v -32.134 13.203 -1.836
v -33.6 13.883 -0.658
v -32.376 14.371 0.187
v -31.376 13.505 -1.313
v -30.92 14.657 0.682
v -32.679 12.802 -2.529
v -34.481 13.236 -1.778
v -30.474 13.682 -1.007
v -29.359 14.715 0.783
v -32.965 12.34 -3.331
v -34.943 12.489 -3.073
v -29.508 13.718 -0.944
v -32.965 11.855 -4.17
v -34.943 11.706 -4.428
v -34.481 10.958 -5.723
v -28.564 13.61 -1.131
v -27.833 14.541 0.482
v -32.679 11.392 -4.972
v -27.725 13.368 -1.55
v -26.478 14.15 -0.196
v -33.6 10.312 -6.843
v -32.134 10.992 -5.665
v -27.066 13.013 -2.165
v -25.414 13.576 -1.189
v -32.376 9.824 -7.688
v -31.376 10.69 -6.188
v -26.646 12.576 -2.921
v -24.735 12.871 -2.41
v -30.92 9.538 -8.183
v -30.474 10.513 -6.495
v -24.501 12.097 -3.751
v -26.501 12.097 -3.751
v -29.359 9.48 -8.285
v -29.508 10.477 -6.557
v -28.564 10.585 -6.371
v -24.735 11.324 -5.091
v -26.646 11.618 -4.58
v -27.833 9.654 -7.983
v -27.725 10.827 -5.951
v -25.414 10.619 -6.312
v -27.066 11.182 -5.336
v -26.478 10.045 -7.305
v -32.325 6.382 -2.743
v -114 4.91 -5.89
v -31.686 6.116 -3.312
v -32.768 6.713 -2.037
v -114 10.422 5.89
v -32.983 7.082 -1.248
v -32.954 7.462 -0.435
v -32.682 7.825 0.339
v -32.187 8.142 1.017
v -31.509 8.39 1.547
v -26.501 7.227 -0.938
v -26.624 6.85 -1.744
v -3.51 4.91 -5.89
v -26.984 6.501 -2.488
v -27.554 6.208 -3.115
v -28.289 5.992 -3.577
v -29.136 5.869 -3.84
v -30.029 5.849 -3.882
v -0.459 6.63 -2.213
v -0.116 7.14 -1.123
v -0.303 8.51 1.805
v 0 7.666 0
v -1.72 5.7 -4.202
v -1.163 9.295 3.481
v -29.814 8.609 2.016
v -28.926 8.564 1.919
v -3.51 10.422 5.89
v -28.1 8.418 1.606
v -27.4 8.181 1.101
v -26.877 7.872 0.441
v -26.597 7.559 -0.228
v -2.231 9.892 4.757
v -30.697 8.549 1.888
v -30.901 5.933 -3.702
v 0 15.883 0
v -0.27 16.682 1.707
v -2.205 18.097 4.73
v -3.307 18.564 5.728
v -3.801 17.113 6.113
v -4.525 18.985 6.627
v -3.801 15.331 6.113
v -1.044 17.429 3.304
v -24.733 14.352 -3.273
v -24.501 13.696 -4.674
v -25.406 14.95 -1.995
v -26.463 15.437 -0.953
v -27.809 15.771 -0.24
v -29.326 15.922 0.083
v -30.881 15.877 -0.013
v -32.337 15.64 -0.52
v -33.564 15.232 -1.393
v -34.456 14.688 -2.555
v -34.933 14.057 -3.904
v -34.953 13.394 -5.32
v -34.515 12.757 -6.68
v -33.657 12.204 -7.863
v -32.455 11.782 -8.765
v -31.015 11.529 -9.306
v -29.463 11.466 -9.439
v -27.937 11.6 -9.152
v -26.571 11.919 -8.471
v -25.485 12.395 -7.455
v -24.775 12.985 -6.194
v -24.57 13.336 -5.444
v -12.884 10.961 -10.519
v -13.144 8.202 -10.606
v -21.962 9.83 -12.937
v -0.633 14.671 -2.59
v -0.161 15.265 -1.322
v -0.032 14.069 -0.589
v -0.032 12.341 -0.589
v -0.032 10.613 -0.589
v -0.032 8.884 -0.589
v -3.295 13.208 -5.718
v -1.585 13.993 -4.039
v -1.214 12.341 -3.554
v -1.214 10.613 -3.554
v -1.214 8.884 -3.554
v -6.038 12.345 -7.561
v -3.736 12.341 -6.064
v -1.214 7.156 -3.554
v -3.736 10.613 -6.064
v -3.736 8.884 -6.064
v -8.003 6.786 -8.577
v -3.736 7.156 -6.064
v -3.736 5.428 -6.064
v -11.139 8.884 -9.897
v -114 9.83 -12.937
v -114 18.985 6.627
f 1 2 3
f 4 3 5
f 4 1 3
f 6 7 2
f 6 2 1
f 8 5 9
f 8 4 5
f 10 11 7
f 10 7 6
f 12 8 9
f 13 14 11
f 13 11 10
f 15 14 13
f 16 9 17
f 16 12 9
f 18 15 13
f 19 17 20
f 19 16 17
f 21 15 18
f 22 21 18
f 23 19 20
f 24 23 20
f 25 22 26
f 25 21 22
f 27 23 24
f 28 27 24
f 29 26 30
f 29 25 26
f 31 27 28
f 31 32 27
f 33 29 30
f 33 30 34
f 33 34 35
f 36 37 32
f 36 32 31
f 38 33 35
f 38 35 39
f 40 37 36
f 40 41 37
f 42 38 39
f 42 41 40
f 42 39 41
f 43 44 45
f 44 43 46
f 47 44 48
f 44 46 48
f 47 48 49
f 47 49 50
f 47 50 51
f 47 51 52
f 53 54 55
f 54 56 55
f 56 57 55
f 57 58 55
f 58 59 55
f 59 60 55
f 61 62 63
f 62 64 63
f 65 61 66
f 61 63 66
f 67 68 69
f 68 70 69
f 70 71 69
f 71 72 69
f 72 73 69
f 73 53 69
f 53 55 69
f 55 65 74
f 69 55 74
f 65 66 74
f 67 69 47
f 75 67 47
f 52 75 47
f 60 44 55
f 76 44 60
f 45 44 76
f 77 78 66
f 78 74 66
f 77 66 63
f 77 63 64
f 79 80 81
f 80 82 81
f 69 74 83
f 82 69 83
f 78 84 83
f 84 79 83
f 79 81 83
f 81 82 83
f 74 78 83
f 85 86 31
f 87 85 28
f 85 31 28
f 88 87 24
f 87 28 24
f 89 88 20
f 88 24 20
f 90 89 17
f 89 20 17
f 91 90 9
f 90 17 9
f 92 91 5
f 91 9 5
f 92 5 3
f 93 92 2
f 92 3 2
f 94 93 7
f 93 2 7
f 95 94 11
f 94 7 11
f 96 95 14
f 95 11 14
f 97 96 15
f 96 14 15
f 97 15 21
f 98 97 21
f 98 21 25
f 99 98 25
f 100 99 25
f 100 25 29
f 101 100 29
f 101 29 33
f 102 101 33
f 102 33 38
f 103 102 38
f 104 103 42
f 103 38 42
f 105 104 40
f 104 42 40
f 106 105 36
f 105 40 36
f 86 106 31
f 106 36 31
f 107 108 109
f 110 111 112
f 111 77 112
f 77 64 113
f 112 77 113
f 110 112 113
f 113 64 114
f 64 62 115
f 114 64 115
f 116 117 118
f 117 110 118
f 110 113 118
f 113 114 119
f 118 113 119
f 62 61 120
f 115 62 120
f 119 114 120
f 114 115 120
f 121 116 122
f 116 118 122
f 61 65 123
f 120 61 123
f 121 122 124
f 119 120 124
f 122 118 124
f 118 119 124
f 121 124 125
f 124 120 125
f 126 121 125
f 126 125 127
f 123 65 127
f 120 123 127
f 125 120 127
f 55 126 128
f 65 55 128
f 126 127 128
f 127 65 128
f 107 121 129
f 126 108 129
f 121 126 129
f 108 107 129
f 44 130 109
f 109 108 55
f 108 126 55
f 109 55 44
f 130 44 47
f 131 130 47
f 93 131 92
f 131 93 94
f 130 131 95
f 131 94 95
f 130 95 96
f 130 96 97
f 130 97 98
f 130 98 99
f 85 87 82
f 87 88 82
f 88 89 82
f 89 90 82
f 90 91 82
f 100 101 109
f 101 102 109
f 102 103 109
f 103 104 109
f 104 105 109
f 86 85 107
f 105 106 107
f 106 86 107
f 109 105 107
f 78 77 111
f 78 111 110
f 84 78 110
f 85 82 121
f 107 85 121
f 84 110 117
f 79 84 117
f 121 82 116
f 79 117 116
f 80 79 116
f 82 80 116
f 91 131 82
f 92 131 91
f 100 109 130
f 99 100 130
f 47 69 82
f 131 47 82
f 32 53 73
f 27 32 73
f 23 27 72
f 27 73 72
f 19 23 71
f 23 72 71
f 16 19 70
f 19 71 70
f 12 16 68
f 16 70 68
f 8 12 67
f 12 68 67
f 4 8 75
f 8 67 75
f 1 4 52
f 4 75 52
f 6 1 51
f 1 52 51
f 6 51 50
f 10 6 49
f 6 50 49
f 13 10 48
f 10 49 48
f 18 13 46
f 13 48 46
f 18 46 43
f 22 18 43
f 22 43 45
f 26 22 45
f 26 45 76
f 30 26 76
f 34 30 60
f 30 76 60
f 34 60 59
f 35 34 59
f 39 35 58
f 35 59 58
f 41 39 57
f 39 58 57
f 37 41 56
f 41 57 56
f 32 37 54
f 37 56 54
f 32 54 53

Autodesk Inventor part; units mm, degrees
sketch "Sketch5" plane through (0, 0, 0) normal (0, 1, 0) x (-1, 0, 0)
  spline S0 degree 4 poles (214, 0.3449) (213.9235, 0.3586) (213.5504, 0.4255) (212.9247, 0.5375) (211.8694, 0.7251) (210.7617, 0.9209) (209.4043, 1.1592) (207.8102, 1.4368) (205.9789, 1.7525) (203.9169, 2.1042) (201.6282, 2.4897) (199.1185, 2.907) (196.3936, 3.3535) (193.4599, 3.8269) (190.3242, 4.3245) (186.9939, 4.8439) (183.4768, 5.3823) (179.781, 5.937) (175.9152, 6.5054) (171.8885, 7.0847) (167.7102, 7.6721) (163.3902, 8.265) (158.9384, 8.8603) (154.3653, 9.4553) (149.6816, 10.047) (144.8982, 10.6323) (140.0263, 11.2083) (135.0773, 11.7717) (130.0627, 12.3193) (124.9942, 12.8478) (119.8837, 13.3538) (114.7431, 13.8337) (109.5844, 14.2841) (104.4196, 14.7015) (99.2609, 15.0822) (94.1202, 15.4227) (89.0095, 15.7197) (83.9407, 15.9697) (78.9258, 16.1695) (73.9764, 16.3162) (69.104, 16.4071) (64.32, 16.4396) (59.6357, 16.4118) (55.0618, 16.3218) (50.6091, 16.1683) (46.288, 15.9504) (42.1085, 15.6678) (38.0804, 15.3204) (34.213, 14.9088) (30.5154, 14.4338) (26.9962, 13.8969) (23.6634, 13.3) (20.5248, 12.6451) (17.5876, 11.9348) (14.8584, 11.1717) (12.3433, 10.3589) (10.0479, 9.4991) (7.977, 8.5956) (6.1348, 7.651) (4.5247, 6.6676) (3.1496, 5.6471) (2.0123, 4.5896) (1.1163, 3.495) (0.468, 2.3618) (0.0758, 1.1958) (-0.0534, 0) (0.0758, -1.1958) (0.468, -2.3618) (1.1163, -3.495) (2.0123, -4.5896) (3.1496, -5.6471) (4.5247, -6.6676) (6.1348, -7.651) (7.977, -8.5956) (10.0479, -9.4991) (12.3433, -10.3589) (14.8584, -11.1717) (17.5876, -11.9348) (20.5248, -12.6451) (23.6634, -13.3) (26.9962, -13.8969) (30.5154, -14.4338) (34.213, -14.9088) (38.0804, -15.3204) (42.1085, -15.6678) (46.288, -15.9504) (50.6091, -16.1683) (55.0618, -16.3218) (59.6357, -16.4118) (64.32, -16.4396) (69.104, -16.4071) (73.9764, -16.3162) (78.9258, -16.1695) (83.9407, -15.9697) (89.0095, -15.7197) (94.1202, -15.4227) (99.2609, -15.0822) (104.4196, -14.7015) (109.5844, -14.2841) (114.7431, -13.8337) (119.8837, -13.3538) (124.9942, -12.8478) (130.0627, -12.3193) (135.0773, -11.7717) (140.0263, -11.2083) (144.8982, -10.6323) (149.6816, -10.047) (154.3653, -9.4553) (158.9384, -8.8603) (163.3902, -8.265) (167.7102, -7.6721) (171.8885, -7.0847) (175.9152, -6.5054) (179.781, -5.937) (183.4768, -5.3823) (186.9939, -4.8439) (190.3242, -4.3245) (193.4599, -3.8269) (196.3936, -3.3535) (199.1185, -2.907) (201.6282, -2.4897) (203.9169, -2.1042) (205.9789, -1.7525) (207.8102, -1.4368) (209.4043, -1.1592) (210.7617, -0.9209) (211.8694, -0.7251) (212.9247, -0.5375) (213.5504, -0.4255) (213.9235, -0.3586) (214, -0.3449) knots 0 0 0 0 0 0.006275 0.009968 0.014263 0.019074 0.024344 0.030027 0.036088 0.042498 0.04923 0.056263 0.063574 0.071147 0.078961 0.087003 0.095255 0.103702 0.112331 0.121128 0.130079 0.13917 0.148391 0.157726 0.167166 0.176696 0.186306 0.195983 0.205715 0.215491 0.225299 0.235127 0.244964 0.254798 0.264619 0.274414 0.284172 0.293881 0.303532 0.313111 0.322608 0.332012 0.34131 0.350493 0.359549 0.368466 0.377233 0.385838 0.39427 0.402518 0.410569 0.418411 0.426034 0.433424 0.440569 0.447459 0.454083 0.460432 0.466498 0.472281 0.477786 0.483031 0.48805 0.4929 0.497646 0.502354 0.5071 0.51195 0.516969 0.522214 0.527719 0.533502 0.539568 0.545917 0.552541 0.559431 0.566576 0.573966 0.581589 0.589431 0.597482 0.60573 0.614162 0.622767 0.631534 0.640451 0.649507 0.65869 0.667988 0.677392 0.686889 0.696468 0.706119 0.715828 0.725586 0.735381 0.745202 0.755036 0.764873 0.774701 0.784509 0.794285 0.804017 0.813694 0.823304 0.832834 0.842274 0.851609 0.86083 0.869921 0.878872 0.887669 0.896298 0.904745 0.912997 0.921039 0.928853 0.936426 0.943737 0.95077 0.957502 0.963912 0.969973 0.975656 0.980926 0.985737 0.990032 0.993725 1 1 1 1 1
  line L0 (204.525, -2) -> (204.525, 2)
  line L1 (204.525, 0) -> (0, 0)
  line L2 (0, 0) -> (61.2, 0)
  line L3 (61.2, 0) -> (61.2, -16.415)
  line L4 (61.2, -16.415) -> (61.2, 16.415)
  point P0 (0, 0)
  point P1 (213.875, 0.3673)
  point P2 (213.5005, 0.4344)
  point P3 (212.8772, 0.5457)
  point P4 (212.0066, 0.7006)
  point P5 (210.8908, 0.8979)
  point P6 (209.5323, 1.1364)
  point P7 (207.9344, 1.4146)
  point P8 (206.1007, 1.7309)
  point P9 (204.0356, 2.0831)
  point P10 (201.7438, 2.4693)
  point P11 (199.2308, 2.8872)
  point P12 (196.5023, 3.3344)
  point P13 (193.5648, 3.8084)
  point P14 (190.4252, 4.3068)
  point P15 (187.0907, 4.8269)
  point P16 (183.5691, 5.366)
  point P17 (179.8687, 5.9215)
  point P18 (175.9981, 6.4907)
  point P19 (171.9664, 7.0708)
  point P20 (167.7829, 7.6591)
  point P21 (163.4575, 8.2526)
  point P22 (159.0002, 8.8488)
  point P23 (154.4215, 9.4444)
  point P24 (149.732, 10.0368)
  point P25 (144.9427, 10.6228)
  point P26 (140.0648, 11.1993)
  point P27 (135.1097, 11.7633)
  point P28 (130.0889, 12.3114)
  point P29 (125.0142, 12.8402)
  point P30 (119.8974, 13.3464)
  point P31 (114.7505, 13.8266)
  point P32 (109.5855, 14.2771)
  point P33 (104.4145, 14.6943)
  point P34 (99.2495, 15.0749)
  point P35 (94.1026, 15.4151)
  point P36 (88.9858, 15.7116)
  point P37 (83.9111, 15.961)
  point P38 (78.8903, 16.1601)
  point P39 (73.9352, 16.306)
  point P40 (69.0573, 16.3958)
  point P41 (64.268, 16.4271)
  point P42 (59.5785, 16.3978)
  point P43 (54.9998, 16.3062)
  point P44 (50.5425, 16.1509)
  point P45 (46.2171, 15.931)
  point P46 (42.0336, 15.6461)
  point P47 (38.0019, 15.2962)
  point P48 (34.1313, 14.8818)
  point P49 (30.4309, 14.4038)
  point P50 (26.9093, 13.8636)
  point P51 (23.5748, 13.2629)
  point P52 (20.4352, 12.6039)
  point P53 (17.4977, 11.889)
  point P54 (14.7693, 11.1209)
  point P55 (12.2562, 10.3027)
  point P56 (9.9644, 9.4372)
  point P57 (7.8993, 8.5276)
  point P58 (6.0656, 7.5769)
  point P59 (4.4677, 6.5883)
  point P60 (3.1092, 5.5644)
  point P61 (1.9934, 4.5081)
  point P62 (1.1228, 3.4216)
  point P63 (0.4995, 2.307)
  point P64 (0.125, 1.1661)
  point P65 (0.125, -1.1661)
  point P66 (0.4995, -2.307)
  point P67 (1.1228, -3.4216)
  point P68 (1.9934, -4.5081)
  point P69 (3.1092, -5.5644)
  point P70 (4.4677, -6.5883)
  point P71 (6.0656, -7.5769)
  point P72 (7.8993, -8.5276)
  point P73 (9.9644, -9.4372)
  point P74 (12.2562, -10.3027)
  point P75 (14.7693, -11.1209)
  point P76 (17.4977, -11.889)
  point P77 (20.4352, -12.6039)
  point P78 (23.5748, -13.2629)
  point P79 (26.9093, -13.8636)
  point P80 (30.4309, -14.4038)
  point P81 (34.1313, -14.8818)
  point P82 (38.0019, -15.2962)
  point P83 (42.0336, -15.6461)
  point P84 (46.2171, -15.931)
  point P85 (50.5425, -16.1509)
  point P86 (54.9998, -16.3062)
  point P87 (59.5785, -16.3978)
  point P88 (64.268, -16.4271)
  point P89 (69.0573, -16.3958)
  point P90 (73.9352, -16.306)
  point P91 (78.8903, -16.1601)
  point P92 (83.9111, -15.961)
  point P93 (88.9858, -15.7116)
  point P94 (94.1026, -15.4151)
  point P95 (99.2495, -15.0749)
  point P96 (104.4145, -14.6943)
  point P97 (109.5855, -14.2771)
  point P98 (114.7505, -13.8266)
  point P99 (119.8974, -13.3464)
  point P100 (125.0142, -12.8402)
  point P101 (130.0889, -12.3114)
  point P102 (135.1097, -11.7633)
  point P103 (140.0648, -11.1993)
  point P104 (144.9427, -10.6228)
  point P105 (149.732, -10.0368)
  point P106 (154.4215, -9.4444)
  point P107 (159.0002, -8.8488)
  point P108 (163.4575, -8.2526)
  point P109 (167.7829, -7.6591)
  point P110 (171.9664, -7.0708)
  point P111 (175.9981, -6.4907)
  point P112 (179.8687, -5.9215)
  point P113 (183.5691, -5.366)
  point P114 (187.0907, -4.8269)
  point P115 (190.4252, -4.3068)
  point P116 (193.5648, -3.8084)
  point P117 (196.5023, -3.3344)
  point P118 (199.2308, -2.8872)
  point P119 (201.7438, -2.4693)
  point P120 (204.0356, -2.0831)
  point P121 (206.1007, -1.7309)
  point P122 (207.9344, -1.4146)
  point P123 (209.5323, -1.1364)
  point P124 (210.8908, -0.8979)
  point P125 (212.0066, -0.7006)
  point P126 (212.8772, -0.5457)
  point P127 (213.5005, -0.4344)
  point P128 (213.875, -0.3673)
  dimension "d28" = 204.525
  dimension "d29" = 61.2
  dimension "d30" = 32.8299
extrude "Main Wing" add sketch "Sketch5" along normal blind 453.491
sketch "Sketch6" plane through (-204.525, 0, 2) normal (-1, 0, 0) x (0, 0, 1)
  line L0 (0, 0) -> (0, 66.548)
  line L1 (0, 453.4889) -> (0, 366.5701)
  line L2 (20, 366.5701) -> (-20, 366.5701)
  line L3 (-20, 66.548) -> (20, 66.548)
  line L4 (20, 66.548) -> (20, 366.5701)
  line L5 (-20, 366.5701) -> (-20, 66.548)
  point P0 (-2, 0)
  dimension "d31" = 66.548
  dimension "d32" = 86.9188
  dimension "d33" = 40
  dimension "d34" = 40
  dimension "d43" = 300.0221
extrude "Rectangle Elevron Gap" cut sketch "Sketch6" against normal blind 69.6214
sketch "Sketch7" plane through (-204.525, 66.548, 2) normal (0, 1, 0) x (1, 0, 0)
  line L0 (69.6201, 13.7865) -> (69.6201, -9.7851)
  line L1 (69.6201, -9.7851) -> (69.6201, 2.0009)
  circle A0 centre (69.6201, 2.0009) radius 17
  circle A1 centre (69.6201, 2.0009) radius 1.7526
  point P0 (204.525, 2)
  point P1 (69.6201, 3.7535)
  point P2 (69.6201, 0.2483)
  dimension "d37" = 23.5717
  dimension "d38" = 11.786
  dimension "d41" = 34
  dimension "d42" = 3.5052
extrude "Circle Elevron Gap" cut sketch "Sketch7" along normal blind 300.0221 contours A1 L0 | A0 picked at (69.7501, 0.8471)
sketch "Sketch8" plane through (0, 453.491, 0) normal (0, 1, 0) x (1, 0, 0)
  line L0 (-204.5238, 0) -> (-143.0304, 0)
  circle A0 centre (-143.0304, 0) radius 1.7526
  point P0 (0, 0)
  dimension "d46" = 61.4934
  dimension "d47" = 3.5052
extrude "Elevron Screw Hole" cut sketch "Sketch8" against normal blind 454.0221
ref_plane "Leading Edge Plane" through (0, 226.7455, 0) normal (-1, 0, 0) x (0, 0, 1)
sketch "Sketch9" plane through (0, 226.7455, 0) normal (-1, 0, 0) x (0, 0, 1)
  line L0 (0, -226.7455) -> (0, 226.7401)
  line L1 (0, 226.7401) -> (0, 213.1781)
  line L2 (0, 213.1781) -> (0, 194.4281)
  circle A0 centre (0, 194.4281) radius 18.75
  line L3 (-14.0018, 198.1799) -> (3.7518, 208.4299)
  line L4 (3.7518, 208.4299) -> (14.0018, 190.6764)
  line L5 (14.0018, 190.6764) -> (-3.7518, 180.4264)
  line L6 (-3.7518, 180.4264) -> (-14.0018, 198.1799)
  line L7 (-14.0018, 198.1799) -> (14.0018, 190.6764) construction
  line L8 (3.7518, 208.4299) -> (-3.7518, 180.4264) construction
  circle A1 centre (0, 194.4281) radius 15.5
  dimension "d50" = 13.562
  dimension "d51" = 18.75
  dimension "d52" = 37.5
  dimension "d55" = 20.5
  dimension "d56" = 20.5
  dimension "d70" = 31
extrude "Circle thingy for boom" add sketch "Sketch9" along normal blind 204.5 contours A1 L0 L3 L6 L5 | L0 L5 L4 L3 A1 | L5 L6 L3 L0 | L0 L3 L4 L5
sketch "Sketch10" plane through (0, 226.7455, 0) normal (1, 0, 0) x (0, 0, -1)
  line L0 (0, 213.1791) -> (0, 194.4291)
  line L1 (13.6215, 199.3869) -> (-4.9578, 208.0506)
  line L2 (-4.9578, 208.0506) -> (-13.6215, 189.4713)
  line L3 (-13.6215, 189.4713) -> (4.9578, 180.8076)
  line L4 (4.9578, 180.8076) -> (13.6215, 199.3869)
  line L5 (13.6215, 199.3869) -> (-13.6215, 189.4713) construction
  line L6 (-4.9578, 208.0506) -> (4.9578, 180.8076) construction
  point P0 (0, -226.7455)
  dimension "d57" = 18.75
  dimension "d58" = 20.5
  dimension "d59" = 20.5
extrude "20x20 hole for boom" cut sketch "Sketch10" against normal blind 205.5
ref_plane "Plane of Pain" through (-204.525, 0, -17) normal (0, 0, 1) x (0, 1, 0)
ref_plane "Work Plane5" through (-204.525, 0, -2) normal (0, 0, 1) x (0, 1, 0)
sketch "Sketch11" plane through (-204.525, 0, -17) normal (0, 0, 1) x (0, 1, 0)
  line L0 (453.4842, 0.0013) -> (403.4842, 0.0013)
  line L1 (403.4842, 0.0013) -> (404.7122, -149.9936)
  circle A0 centre (404.7122, -149.9936) radius 5.25
  line L2 (404.7122, -149.9936) -> (219.7122, -149.9936)
  circle A1 centre (219.7122, -149.9936) radius 5.25
  line L3 (366.5707, -80.63) -> (219.7122, -80.63)
  line L4 (219.7122, -80.63) -> (219.7122, -149.9936)
  point P0 (0, -204.525)
  dimension "d64" = 50
  dimension "d65" = 150
  dimension "d66" = 10.5
  dimension "d67" = 185
  dimension "d121" = 146.8585
  dimension "d122" = 69.3637
ref_plane "20x20 Plane" through (0, 416.8428, -9.2897) normal (0, 0.4226183, 0.9063078) x (1, 0, 0)
sketch "Sketch12" plane through (0, 416.8428, -9.2897) normal (0, 0.4226183, 0.9063078) x (1, 0, 0)
  line L0 (0, 10.2503) -> (0, 0.0003)
  line L1 (0, 0.0003) -> (-55, 0.0003)
  circle A0 centre (-55, 0.0003) radius 5.25
  circle A1 centre (-55, 0.0003) radius 2.75
  point P0 (0, -381.7138)
  dimension "d71" = 10.25
  dimension "d72" = 55
  dimension "d73" = 10.5
  dimension "d74" = 5.5
sketch "Sketch13" plane through (0, 416.8428, -9.2897) normal (0, 0.4226183, 0.9063078) x (1, 0, 0)
  circle A0 centre (-55, 0) radius 5.25
  circle A1 centre (-55, 0) radius 2.75
  point P0 (0, -381.7138)
  dimension "d77" = 10.5
  dimension "d82" = 5.5
extrude "Boom Screw Head" cut sketch "Sketch13" against normal blind 13.75 contours A0 | A1
extrude "Boom Screw Hole" add sketch "Sketch12" against normal blind 3
sketch "Sketch14" plane through (-204.525, 366.5701, -2) normal (0, -1, 0) x (1, 0, 0)
  line L0 (61.5404, 3.7631) -> (61.5404, 7.2141)
  line L1 (61.5404, 7.2141) -> (43.5474, 7.2141)
  line L2 (61.5404, 7.2141) -> (69.3184, 7.2141)
  line L3 (43.5474, 7.2141) -> (43.5474, -10.2859)
  line L4 (69.3184, 7.2141) -> (69.3184, -10.2859)
  line L5 (43.5474, -10.2859) -> (69.3184, -10.2859)
  point P0 (204.525, 2)
  dimension "d89" = 3.451
  dimension "d90" = 17.993
  dimension "d91" = 7.778
  dimension "d93" = 17.5
  dimension "d94" = 17.5
extrude "Servo Hole" cut sketch "Sketch14" against normal blind 28.763
sketch "Sketch15" plane through (-135.2066, 366.5701, -11.7525) normal (-1, 0, 0) x (0, 0, 1)
  line L0 (17, 0) -> (17, 6)
  line L1 (17, 6) -> (17, 8)
  line L2 (17, 8) -> (-3, 8)
  line L3 (-3, 8) -> (-3, 6)
  line L4 (-3, 6) -> (17, 6)
  point P0 (11.7525, -366.5701)
  dimension "d97" = 6
  dimension "d98" = 2
  dimension "d99" = 2
extrude "Servo Sidewall 1" cut sketch "Sketch15" against normal blind 2.782
sketch "Sketch16" plane through (-160.9776, 366.5701, 5.2141) normal (1, 0, 0) x (0, 0, -1)
  line L0 (0, 0) -> (0, 6)
  line L1 (0, 6) -> (0, 8)
  line L2 (0, 8) -> (14, 8)
  line L3 (14, 8) -> (14, 6)
  line L4 (14, 6) -> (0, 6)
  point P0 (5.2141, -366.5701)
  dimension "d102" = 6
  dimension "d103" = 2
extrude "Servo Sidewall 2" cut sketch "Sketch16" against normal blind 2.782
sketch "Sketch17" plane through (-135.2066, 366.5701, 5.2141) normal (0, 0, -1) x (-1, 0, 0)
  line L0 (0, 8) -> (0, 16.3)
  line L1 (0, 28.7478) -> (0, 23.2698)
  line L2 (0, 16.3) -> (-27.1565, 48.6638)
  line L3 (0, 23.2698) -> (-27.1565, 55.6336)
  line L4 (-27.1565, 48.6638) -> (-27.1565, 55.6336)
  line L5 (0, 23.2698) -> (0, 16.3)
  point P0 (-135.2066, -366.5701)
  point P1 (0, 23.2698)
  dimension "d106" = 8.3
  dimension "d107" = 5.478
  dimension "d108" = 42.248
  dimension "d109" = 42.248
extrude "some slant hole" cut sketch "Sketch17" along normal blind 23.75
fillet "Fillet for slant" radius 7.7 2 edges at (-135.2066, 382.8701, -3.2692) (-135.2066, 389.8399, -3.2692)
sketch "Sketch18" plane through (-204.525, 0, -17) normal (0, 0, 1) x (0, 1, 0)
  circle A0 centre (219.7124, -149.9979) radius 3.25
  point P0 (0, -204.525)
  dimension "d113" = 6.5
extrude "Screwhead for something" cut sketch "Sketch11" along normal blind 5.25 contours A1 L4 L2 | L2 L4 A1
extrude "screwhole for thingy" cut sketch "Sketch18" along normal blind 41.75
ref_plane "Work Plane10" through (-182.7513, 87.2769, 166.4641) normal (0, 0.8660254, -0.5) x (1, 0, 0)
ref_plane "Work Plane9" through (-182.7513, 366.5701, 5.2141) normal (0, 0.8660254, -0.5) x (1, 0, 0)
ref_plane "Bottom of Airfoil" through (-204.525, 0, 16.5) normal (0, 0, 1) x (0, 1, 0)
sketch "Sketch21" plane through (-204.525, 0, 16.5) normal (0, 0, 1) x (0, 1, 0)
  line L0 (366.5707, -80.6294) -> (219.7127, -80.6294)
  line L1 (219.7127, -80.6294) -> (219.7127, -149.9934)
  line L2 (219.7127, -149.9934) -> (214.6627, -149.9934)
  line L3 (214.6627, -147.0779) -> (214.6627, -152.9089)
  line L4 (214.6627, -147.0779) -> (219.7125, -144.1624)
  line L5 (219.7125, -144.1624) -> (224.7623, -147.0779)
  line L6 (224.7623, -147.0779) -> (224.7623, -152.9089)
  line L7 (224.7623, -152.9089) -> (219.7125, -155.8244)
  line L8 (214.6627, -152.9089) -> (219.7125, -155.8244)
  point P0 (0, -204.525)
  point P1 (224.7623, -147.0779)
  dimension "d123" = 146.858
  dimension "d124" = 69.364
  dimension "d125" = 5.05
  dimension "d126" = 5.831
  dimension "d127" = 5.831
  dimension "d128" = 5.831
  dimension "d129" = 5.831
  dimension "d130" = 5.831
extrude "Hexagon Hole of Doom" cut sketch "Sketch21" against normal blind 4
sketch "Sketch22" plane through (-182.7513, 87.2769, 166.4641) normal (0, 0.8660254, -0.5) x (1, 0, 0)
  line L0 (138, 200) -> (153, 200)
  line L1 (153, 200) -> (153, 185)
  circle A0 centre (153, 185) radius 5.25
  line L2 (153, 185) -> (61.5, 185)
  circle A1 centre (61.5, 185) radius 5.25
  point P0 (182.7513, 187.8006)
  dimension "d137" = 15
  dimension "d138" = 15
  dimension "d139" = 10.5
  dimension "d140" = 91.5
  dimension "d141" = 10.5
extrude "Extrusion23" cut sketch "Sketch22" along normal blind 68.25
sketch "Sketch23" plane through (-182.7513, 87.2769, 166.4641) normal (0, 0.8660254, -0.5) x (1, 0, 0)
  line L0 (138, 200) -> (153, 200)
  line L1 (153, 200) -> (153, 185)
  line L2 (153, 185) -> (61.5, 185)
  circle A0 centre (153, 185) radius 5.25
  circle A1 centre (153, 185) radius 3.25
  circle A2 centre (61.5, 185) radius 5.25
  circle A3 centre (61.5, 185) radius 3.25
  point P0 (182.7513, 187.8006)
  dimension "d144" = 15
  dimension "d145" = 15
  dimension "d146" = 91.5
  dimension "d147" = 10.5
  dimension "d148" = 6.5
  dimension "d149" = 10.5
  dimension "d150" = 6.5
extrude "Extrusion24" add sketch "Sketch23" along normal blind 20 contours A0 L2 A1 L1 | L1 A1 L2 A0 | A2
sketch "Sketch24" plane through (0, 0, 0) normal (0, -1, 0) x (1, 0, 0)
  line L0 (0, -15) -> (-205, -15)
  line L1 (-205, -15) -> (-205, 16)
  line L2 (-205, 16) -> (0, 16)
  line L3 (0, 16) -> (0, -15)
  point P0 (0, 0)
extrude "Extrusion25" cut sketch "Sketch24" along normal blind 8.75
sketch "Sketch25" plane through (0, 226.7455, 0) normal (-1, 0, 0) x (0, 0, 1)
  line L0 (-16.4181, -226.7909) -> (20.5607, -226.7909) construction
  line L1 (17.0941, -211.1086) -> (17.0941, -226.7909)
  line L2 (17.0941, -226.7909) -> (-16.4181, -226.7909)
  line L3 (-16.4181, -226.7909) -> (36.2607, -226.7909) construction
  line L4 (-16.4181, -226.7909) -> (17.4356, -226.7909)
  line L5 (0, -226.7455) -> (0, -219.0797)
  line L6 (17.0941, -201.9506) -> (17.0941, -211.1086)
  line L7 (-36.0788, -226.7909) -> (-16.4181, -226.7909)
  line L8 (-6.0768, -213.6552) -> (5.8907, -213.6552) construction
  line L9 (-5.8898, -221.8359) -> (5.8898, -216.3235)
  line L10 (5.8898, -216.3235) -> (6.6273, -207.7608)
  line L11 (6.6273, -207.7608) -> (-12.9366, -216.9159)
  line L12 (-12.9366, -216.9159) -> (-5.8898, -221.8359)
  line L13 (-16.4181, -226.7909) -> (17.0941, -211.1086)
  line L14 (17.0941, -226.7909) -> (-16.4393, -226.7909)
  line L15 (-16.4393, -226.7909) -> (-16.4393, 228)
  line L16 (-16.4393, 228) -> (17.0941, 228)
  line L17 (17.0941, 228) -> (17.0941, -226.7909)
  point P0 (-16.4393, -226.7455)
  dimension "d155" = 37
  dimension "d221" = 60
  dimension "d222" = 60
  dimension "d223" = 7.443
  dimension "d232" = 21.6
  dimension "d233" = 13.0056
ref_plane "Work Plane14" through (0, 366.491, 0) normal (0, 1, 0) x (1, 0, 0)
ref_plane "Work Plane15" through (-168.2987, 4.1455, -7.5873) normal (0, -0.9063078, 0.4226183) x (1, 0, 0)
extrude "Extrusion36" cut sketch "Sketch25" along normal blind 236.5
sketch "Sketch35" plane through (-180.0822, 4.9096, -5.8898) normal (0, -0.9057349, 0.4238446) x (1, 0, 0)
  line L0 (180.0822, 3.2537) -> (65.0822, 3.2537)
  line L1 (65.0822, 3.2537) -> (65.0822, 21.0434)
  line L2 (65.0822, 21.0434) -> (-29.1113, 21.0434)
  line L3 (-29.1113, 21.0434) -> (-29.1113, -11.9566)
  line L4 (-29.1113, -11.9566) -> (65.0822, -11.9566)
  line L5 (65.0822, -11.9566) -> (65.0822, 3.2537)
  line L6 (65.0822, 3.2537) -> (66.0822, 3.2537)
  line L7 (66.0822, 3.2537) -> (66.0822, 21.0434)
  line L8 (66.0822, 21.0434) -> (65.0822, 21.0434)
  line L9 (65.0822, -11.9566) -> (66.0822, -11.9566)
  line L10 (66.0822, -11.9566) -> (66.0822, 3.2537)
  dimension "d226" = 115
  dimension "d234" = 1
extrude "Extrusion37" cut sketch "Sketch35" against normal blind 236.5
ref_plane "Work Plane8" through (0, 0, 0) normal (0, -1, 0) x (1, 0, 0)
properties part number "connector"
